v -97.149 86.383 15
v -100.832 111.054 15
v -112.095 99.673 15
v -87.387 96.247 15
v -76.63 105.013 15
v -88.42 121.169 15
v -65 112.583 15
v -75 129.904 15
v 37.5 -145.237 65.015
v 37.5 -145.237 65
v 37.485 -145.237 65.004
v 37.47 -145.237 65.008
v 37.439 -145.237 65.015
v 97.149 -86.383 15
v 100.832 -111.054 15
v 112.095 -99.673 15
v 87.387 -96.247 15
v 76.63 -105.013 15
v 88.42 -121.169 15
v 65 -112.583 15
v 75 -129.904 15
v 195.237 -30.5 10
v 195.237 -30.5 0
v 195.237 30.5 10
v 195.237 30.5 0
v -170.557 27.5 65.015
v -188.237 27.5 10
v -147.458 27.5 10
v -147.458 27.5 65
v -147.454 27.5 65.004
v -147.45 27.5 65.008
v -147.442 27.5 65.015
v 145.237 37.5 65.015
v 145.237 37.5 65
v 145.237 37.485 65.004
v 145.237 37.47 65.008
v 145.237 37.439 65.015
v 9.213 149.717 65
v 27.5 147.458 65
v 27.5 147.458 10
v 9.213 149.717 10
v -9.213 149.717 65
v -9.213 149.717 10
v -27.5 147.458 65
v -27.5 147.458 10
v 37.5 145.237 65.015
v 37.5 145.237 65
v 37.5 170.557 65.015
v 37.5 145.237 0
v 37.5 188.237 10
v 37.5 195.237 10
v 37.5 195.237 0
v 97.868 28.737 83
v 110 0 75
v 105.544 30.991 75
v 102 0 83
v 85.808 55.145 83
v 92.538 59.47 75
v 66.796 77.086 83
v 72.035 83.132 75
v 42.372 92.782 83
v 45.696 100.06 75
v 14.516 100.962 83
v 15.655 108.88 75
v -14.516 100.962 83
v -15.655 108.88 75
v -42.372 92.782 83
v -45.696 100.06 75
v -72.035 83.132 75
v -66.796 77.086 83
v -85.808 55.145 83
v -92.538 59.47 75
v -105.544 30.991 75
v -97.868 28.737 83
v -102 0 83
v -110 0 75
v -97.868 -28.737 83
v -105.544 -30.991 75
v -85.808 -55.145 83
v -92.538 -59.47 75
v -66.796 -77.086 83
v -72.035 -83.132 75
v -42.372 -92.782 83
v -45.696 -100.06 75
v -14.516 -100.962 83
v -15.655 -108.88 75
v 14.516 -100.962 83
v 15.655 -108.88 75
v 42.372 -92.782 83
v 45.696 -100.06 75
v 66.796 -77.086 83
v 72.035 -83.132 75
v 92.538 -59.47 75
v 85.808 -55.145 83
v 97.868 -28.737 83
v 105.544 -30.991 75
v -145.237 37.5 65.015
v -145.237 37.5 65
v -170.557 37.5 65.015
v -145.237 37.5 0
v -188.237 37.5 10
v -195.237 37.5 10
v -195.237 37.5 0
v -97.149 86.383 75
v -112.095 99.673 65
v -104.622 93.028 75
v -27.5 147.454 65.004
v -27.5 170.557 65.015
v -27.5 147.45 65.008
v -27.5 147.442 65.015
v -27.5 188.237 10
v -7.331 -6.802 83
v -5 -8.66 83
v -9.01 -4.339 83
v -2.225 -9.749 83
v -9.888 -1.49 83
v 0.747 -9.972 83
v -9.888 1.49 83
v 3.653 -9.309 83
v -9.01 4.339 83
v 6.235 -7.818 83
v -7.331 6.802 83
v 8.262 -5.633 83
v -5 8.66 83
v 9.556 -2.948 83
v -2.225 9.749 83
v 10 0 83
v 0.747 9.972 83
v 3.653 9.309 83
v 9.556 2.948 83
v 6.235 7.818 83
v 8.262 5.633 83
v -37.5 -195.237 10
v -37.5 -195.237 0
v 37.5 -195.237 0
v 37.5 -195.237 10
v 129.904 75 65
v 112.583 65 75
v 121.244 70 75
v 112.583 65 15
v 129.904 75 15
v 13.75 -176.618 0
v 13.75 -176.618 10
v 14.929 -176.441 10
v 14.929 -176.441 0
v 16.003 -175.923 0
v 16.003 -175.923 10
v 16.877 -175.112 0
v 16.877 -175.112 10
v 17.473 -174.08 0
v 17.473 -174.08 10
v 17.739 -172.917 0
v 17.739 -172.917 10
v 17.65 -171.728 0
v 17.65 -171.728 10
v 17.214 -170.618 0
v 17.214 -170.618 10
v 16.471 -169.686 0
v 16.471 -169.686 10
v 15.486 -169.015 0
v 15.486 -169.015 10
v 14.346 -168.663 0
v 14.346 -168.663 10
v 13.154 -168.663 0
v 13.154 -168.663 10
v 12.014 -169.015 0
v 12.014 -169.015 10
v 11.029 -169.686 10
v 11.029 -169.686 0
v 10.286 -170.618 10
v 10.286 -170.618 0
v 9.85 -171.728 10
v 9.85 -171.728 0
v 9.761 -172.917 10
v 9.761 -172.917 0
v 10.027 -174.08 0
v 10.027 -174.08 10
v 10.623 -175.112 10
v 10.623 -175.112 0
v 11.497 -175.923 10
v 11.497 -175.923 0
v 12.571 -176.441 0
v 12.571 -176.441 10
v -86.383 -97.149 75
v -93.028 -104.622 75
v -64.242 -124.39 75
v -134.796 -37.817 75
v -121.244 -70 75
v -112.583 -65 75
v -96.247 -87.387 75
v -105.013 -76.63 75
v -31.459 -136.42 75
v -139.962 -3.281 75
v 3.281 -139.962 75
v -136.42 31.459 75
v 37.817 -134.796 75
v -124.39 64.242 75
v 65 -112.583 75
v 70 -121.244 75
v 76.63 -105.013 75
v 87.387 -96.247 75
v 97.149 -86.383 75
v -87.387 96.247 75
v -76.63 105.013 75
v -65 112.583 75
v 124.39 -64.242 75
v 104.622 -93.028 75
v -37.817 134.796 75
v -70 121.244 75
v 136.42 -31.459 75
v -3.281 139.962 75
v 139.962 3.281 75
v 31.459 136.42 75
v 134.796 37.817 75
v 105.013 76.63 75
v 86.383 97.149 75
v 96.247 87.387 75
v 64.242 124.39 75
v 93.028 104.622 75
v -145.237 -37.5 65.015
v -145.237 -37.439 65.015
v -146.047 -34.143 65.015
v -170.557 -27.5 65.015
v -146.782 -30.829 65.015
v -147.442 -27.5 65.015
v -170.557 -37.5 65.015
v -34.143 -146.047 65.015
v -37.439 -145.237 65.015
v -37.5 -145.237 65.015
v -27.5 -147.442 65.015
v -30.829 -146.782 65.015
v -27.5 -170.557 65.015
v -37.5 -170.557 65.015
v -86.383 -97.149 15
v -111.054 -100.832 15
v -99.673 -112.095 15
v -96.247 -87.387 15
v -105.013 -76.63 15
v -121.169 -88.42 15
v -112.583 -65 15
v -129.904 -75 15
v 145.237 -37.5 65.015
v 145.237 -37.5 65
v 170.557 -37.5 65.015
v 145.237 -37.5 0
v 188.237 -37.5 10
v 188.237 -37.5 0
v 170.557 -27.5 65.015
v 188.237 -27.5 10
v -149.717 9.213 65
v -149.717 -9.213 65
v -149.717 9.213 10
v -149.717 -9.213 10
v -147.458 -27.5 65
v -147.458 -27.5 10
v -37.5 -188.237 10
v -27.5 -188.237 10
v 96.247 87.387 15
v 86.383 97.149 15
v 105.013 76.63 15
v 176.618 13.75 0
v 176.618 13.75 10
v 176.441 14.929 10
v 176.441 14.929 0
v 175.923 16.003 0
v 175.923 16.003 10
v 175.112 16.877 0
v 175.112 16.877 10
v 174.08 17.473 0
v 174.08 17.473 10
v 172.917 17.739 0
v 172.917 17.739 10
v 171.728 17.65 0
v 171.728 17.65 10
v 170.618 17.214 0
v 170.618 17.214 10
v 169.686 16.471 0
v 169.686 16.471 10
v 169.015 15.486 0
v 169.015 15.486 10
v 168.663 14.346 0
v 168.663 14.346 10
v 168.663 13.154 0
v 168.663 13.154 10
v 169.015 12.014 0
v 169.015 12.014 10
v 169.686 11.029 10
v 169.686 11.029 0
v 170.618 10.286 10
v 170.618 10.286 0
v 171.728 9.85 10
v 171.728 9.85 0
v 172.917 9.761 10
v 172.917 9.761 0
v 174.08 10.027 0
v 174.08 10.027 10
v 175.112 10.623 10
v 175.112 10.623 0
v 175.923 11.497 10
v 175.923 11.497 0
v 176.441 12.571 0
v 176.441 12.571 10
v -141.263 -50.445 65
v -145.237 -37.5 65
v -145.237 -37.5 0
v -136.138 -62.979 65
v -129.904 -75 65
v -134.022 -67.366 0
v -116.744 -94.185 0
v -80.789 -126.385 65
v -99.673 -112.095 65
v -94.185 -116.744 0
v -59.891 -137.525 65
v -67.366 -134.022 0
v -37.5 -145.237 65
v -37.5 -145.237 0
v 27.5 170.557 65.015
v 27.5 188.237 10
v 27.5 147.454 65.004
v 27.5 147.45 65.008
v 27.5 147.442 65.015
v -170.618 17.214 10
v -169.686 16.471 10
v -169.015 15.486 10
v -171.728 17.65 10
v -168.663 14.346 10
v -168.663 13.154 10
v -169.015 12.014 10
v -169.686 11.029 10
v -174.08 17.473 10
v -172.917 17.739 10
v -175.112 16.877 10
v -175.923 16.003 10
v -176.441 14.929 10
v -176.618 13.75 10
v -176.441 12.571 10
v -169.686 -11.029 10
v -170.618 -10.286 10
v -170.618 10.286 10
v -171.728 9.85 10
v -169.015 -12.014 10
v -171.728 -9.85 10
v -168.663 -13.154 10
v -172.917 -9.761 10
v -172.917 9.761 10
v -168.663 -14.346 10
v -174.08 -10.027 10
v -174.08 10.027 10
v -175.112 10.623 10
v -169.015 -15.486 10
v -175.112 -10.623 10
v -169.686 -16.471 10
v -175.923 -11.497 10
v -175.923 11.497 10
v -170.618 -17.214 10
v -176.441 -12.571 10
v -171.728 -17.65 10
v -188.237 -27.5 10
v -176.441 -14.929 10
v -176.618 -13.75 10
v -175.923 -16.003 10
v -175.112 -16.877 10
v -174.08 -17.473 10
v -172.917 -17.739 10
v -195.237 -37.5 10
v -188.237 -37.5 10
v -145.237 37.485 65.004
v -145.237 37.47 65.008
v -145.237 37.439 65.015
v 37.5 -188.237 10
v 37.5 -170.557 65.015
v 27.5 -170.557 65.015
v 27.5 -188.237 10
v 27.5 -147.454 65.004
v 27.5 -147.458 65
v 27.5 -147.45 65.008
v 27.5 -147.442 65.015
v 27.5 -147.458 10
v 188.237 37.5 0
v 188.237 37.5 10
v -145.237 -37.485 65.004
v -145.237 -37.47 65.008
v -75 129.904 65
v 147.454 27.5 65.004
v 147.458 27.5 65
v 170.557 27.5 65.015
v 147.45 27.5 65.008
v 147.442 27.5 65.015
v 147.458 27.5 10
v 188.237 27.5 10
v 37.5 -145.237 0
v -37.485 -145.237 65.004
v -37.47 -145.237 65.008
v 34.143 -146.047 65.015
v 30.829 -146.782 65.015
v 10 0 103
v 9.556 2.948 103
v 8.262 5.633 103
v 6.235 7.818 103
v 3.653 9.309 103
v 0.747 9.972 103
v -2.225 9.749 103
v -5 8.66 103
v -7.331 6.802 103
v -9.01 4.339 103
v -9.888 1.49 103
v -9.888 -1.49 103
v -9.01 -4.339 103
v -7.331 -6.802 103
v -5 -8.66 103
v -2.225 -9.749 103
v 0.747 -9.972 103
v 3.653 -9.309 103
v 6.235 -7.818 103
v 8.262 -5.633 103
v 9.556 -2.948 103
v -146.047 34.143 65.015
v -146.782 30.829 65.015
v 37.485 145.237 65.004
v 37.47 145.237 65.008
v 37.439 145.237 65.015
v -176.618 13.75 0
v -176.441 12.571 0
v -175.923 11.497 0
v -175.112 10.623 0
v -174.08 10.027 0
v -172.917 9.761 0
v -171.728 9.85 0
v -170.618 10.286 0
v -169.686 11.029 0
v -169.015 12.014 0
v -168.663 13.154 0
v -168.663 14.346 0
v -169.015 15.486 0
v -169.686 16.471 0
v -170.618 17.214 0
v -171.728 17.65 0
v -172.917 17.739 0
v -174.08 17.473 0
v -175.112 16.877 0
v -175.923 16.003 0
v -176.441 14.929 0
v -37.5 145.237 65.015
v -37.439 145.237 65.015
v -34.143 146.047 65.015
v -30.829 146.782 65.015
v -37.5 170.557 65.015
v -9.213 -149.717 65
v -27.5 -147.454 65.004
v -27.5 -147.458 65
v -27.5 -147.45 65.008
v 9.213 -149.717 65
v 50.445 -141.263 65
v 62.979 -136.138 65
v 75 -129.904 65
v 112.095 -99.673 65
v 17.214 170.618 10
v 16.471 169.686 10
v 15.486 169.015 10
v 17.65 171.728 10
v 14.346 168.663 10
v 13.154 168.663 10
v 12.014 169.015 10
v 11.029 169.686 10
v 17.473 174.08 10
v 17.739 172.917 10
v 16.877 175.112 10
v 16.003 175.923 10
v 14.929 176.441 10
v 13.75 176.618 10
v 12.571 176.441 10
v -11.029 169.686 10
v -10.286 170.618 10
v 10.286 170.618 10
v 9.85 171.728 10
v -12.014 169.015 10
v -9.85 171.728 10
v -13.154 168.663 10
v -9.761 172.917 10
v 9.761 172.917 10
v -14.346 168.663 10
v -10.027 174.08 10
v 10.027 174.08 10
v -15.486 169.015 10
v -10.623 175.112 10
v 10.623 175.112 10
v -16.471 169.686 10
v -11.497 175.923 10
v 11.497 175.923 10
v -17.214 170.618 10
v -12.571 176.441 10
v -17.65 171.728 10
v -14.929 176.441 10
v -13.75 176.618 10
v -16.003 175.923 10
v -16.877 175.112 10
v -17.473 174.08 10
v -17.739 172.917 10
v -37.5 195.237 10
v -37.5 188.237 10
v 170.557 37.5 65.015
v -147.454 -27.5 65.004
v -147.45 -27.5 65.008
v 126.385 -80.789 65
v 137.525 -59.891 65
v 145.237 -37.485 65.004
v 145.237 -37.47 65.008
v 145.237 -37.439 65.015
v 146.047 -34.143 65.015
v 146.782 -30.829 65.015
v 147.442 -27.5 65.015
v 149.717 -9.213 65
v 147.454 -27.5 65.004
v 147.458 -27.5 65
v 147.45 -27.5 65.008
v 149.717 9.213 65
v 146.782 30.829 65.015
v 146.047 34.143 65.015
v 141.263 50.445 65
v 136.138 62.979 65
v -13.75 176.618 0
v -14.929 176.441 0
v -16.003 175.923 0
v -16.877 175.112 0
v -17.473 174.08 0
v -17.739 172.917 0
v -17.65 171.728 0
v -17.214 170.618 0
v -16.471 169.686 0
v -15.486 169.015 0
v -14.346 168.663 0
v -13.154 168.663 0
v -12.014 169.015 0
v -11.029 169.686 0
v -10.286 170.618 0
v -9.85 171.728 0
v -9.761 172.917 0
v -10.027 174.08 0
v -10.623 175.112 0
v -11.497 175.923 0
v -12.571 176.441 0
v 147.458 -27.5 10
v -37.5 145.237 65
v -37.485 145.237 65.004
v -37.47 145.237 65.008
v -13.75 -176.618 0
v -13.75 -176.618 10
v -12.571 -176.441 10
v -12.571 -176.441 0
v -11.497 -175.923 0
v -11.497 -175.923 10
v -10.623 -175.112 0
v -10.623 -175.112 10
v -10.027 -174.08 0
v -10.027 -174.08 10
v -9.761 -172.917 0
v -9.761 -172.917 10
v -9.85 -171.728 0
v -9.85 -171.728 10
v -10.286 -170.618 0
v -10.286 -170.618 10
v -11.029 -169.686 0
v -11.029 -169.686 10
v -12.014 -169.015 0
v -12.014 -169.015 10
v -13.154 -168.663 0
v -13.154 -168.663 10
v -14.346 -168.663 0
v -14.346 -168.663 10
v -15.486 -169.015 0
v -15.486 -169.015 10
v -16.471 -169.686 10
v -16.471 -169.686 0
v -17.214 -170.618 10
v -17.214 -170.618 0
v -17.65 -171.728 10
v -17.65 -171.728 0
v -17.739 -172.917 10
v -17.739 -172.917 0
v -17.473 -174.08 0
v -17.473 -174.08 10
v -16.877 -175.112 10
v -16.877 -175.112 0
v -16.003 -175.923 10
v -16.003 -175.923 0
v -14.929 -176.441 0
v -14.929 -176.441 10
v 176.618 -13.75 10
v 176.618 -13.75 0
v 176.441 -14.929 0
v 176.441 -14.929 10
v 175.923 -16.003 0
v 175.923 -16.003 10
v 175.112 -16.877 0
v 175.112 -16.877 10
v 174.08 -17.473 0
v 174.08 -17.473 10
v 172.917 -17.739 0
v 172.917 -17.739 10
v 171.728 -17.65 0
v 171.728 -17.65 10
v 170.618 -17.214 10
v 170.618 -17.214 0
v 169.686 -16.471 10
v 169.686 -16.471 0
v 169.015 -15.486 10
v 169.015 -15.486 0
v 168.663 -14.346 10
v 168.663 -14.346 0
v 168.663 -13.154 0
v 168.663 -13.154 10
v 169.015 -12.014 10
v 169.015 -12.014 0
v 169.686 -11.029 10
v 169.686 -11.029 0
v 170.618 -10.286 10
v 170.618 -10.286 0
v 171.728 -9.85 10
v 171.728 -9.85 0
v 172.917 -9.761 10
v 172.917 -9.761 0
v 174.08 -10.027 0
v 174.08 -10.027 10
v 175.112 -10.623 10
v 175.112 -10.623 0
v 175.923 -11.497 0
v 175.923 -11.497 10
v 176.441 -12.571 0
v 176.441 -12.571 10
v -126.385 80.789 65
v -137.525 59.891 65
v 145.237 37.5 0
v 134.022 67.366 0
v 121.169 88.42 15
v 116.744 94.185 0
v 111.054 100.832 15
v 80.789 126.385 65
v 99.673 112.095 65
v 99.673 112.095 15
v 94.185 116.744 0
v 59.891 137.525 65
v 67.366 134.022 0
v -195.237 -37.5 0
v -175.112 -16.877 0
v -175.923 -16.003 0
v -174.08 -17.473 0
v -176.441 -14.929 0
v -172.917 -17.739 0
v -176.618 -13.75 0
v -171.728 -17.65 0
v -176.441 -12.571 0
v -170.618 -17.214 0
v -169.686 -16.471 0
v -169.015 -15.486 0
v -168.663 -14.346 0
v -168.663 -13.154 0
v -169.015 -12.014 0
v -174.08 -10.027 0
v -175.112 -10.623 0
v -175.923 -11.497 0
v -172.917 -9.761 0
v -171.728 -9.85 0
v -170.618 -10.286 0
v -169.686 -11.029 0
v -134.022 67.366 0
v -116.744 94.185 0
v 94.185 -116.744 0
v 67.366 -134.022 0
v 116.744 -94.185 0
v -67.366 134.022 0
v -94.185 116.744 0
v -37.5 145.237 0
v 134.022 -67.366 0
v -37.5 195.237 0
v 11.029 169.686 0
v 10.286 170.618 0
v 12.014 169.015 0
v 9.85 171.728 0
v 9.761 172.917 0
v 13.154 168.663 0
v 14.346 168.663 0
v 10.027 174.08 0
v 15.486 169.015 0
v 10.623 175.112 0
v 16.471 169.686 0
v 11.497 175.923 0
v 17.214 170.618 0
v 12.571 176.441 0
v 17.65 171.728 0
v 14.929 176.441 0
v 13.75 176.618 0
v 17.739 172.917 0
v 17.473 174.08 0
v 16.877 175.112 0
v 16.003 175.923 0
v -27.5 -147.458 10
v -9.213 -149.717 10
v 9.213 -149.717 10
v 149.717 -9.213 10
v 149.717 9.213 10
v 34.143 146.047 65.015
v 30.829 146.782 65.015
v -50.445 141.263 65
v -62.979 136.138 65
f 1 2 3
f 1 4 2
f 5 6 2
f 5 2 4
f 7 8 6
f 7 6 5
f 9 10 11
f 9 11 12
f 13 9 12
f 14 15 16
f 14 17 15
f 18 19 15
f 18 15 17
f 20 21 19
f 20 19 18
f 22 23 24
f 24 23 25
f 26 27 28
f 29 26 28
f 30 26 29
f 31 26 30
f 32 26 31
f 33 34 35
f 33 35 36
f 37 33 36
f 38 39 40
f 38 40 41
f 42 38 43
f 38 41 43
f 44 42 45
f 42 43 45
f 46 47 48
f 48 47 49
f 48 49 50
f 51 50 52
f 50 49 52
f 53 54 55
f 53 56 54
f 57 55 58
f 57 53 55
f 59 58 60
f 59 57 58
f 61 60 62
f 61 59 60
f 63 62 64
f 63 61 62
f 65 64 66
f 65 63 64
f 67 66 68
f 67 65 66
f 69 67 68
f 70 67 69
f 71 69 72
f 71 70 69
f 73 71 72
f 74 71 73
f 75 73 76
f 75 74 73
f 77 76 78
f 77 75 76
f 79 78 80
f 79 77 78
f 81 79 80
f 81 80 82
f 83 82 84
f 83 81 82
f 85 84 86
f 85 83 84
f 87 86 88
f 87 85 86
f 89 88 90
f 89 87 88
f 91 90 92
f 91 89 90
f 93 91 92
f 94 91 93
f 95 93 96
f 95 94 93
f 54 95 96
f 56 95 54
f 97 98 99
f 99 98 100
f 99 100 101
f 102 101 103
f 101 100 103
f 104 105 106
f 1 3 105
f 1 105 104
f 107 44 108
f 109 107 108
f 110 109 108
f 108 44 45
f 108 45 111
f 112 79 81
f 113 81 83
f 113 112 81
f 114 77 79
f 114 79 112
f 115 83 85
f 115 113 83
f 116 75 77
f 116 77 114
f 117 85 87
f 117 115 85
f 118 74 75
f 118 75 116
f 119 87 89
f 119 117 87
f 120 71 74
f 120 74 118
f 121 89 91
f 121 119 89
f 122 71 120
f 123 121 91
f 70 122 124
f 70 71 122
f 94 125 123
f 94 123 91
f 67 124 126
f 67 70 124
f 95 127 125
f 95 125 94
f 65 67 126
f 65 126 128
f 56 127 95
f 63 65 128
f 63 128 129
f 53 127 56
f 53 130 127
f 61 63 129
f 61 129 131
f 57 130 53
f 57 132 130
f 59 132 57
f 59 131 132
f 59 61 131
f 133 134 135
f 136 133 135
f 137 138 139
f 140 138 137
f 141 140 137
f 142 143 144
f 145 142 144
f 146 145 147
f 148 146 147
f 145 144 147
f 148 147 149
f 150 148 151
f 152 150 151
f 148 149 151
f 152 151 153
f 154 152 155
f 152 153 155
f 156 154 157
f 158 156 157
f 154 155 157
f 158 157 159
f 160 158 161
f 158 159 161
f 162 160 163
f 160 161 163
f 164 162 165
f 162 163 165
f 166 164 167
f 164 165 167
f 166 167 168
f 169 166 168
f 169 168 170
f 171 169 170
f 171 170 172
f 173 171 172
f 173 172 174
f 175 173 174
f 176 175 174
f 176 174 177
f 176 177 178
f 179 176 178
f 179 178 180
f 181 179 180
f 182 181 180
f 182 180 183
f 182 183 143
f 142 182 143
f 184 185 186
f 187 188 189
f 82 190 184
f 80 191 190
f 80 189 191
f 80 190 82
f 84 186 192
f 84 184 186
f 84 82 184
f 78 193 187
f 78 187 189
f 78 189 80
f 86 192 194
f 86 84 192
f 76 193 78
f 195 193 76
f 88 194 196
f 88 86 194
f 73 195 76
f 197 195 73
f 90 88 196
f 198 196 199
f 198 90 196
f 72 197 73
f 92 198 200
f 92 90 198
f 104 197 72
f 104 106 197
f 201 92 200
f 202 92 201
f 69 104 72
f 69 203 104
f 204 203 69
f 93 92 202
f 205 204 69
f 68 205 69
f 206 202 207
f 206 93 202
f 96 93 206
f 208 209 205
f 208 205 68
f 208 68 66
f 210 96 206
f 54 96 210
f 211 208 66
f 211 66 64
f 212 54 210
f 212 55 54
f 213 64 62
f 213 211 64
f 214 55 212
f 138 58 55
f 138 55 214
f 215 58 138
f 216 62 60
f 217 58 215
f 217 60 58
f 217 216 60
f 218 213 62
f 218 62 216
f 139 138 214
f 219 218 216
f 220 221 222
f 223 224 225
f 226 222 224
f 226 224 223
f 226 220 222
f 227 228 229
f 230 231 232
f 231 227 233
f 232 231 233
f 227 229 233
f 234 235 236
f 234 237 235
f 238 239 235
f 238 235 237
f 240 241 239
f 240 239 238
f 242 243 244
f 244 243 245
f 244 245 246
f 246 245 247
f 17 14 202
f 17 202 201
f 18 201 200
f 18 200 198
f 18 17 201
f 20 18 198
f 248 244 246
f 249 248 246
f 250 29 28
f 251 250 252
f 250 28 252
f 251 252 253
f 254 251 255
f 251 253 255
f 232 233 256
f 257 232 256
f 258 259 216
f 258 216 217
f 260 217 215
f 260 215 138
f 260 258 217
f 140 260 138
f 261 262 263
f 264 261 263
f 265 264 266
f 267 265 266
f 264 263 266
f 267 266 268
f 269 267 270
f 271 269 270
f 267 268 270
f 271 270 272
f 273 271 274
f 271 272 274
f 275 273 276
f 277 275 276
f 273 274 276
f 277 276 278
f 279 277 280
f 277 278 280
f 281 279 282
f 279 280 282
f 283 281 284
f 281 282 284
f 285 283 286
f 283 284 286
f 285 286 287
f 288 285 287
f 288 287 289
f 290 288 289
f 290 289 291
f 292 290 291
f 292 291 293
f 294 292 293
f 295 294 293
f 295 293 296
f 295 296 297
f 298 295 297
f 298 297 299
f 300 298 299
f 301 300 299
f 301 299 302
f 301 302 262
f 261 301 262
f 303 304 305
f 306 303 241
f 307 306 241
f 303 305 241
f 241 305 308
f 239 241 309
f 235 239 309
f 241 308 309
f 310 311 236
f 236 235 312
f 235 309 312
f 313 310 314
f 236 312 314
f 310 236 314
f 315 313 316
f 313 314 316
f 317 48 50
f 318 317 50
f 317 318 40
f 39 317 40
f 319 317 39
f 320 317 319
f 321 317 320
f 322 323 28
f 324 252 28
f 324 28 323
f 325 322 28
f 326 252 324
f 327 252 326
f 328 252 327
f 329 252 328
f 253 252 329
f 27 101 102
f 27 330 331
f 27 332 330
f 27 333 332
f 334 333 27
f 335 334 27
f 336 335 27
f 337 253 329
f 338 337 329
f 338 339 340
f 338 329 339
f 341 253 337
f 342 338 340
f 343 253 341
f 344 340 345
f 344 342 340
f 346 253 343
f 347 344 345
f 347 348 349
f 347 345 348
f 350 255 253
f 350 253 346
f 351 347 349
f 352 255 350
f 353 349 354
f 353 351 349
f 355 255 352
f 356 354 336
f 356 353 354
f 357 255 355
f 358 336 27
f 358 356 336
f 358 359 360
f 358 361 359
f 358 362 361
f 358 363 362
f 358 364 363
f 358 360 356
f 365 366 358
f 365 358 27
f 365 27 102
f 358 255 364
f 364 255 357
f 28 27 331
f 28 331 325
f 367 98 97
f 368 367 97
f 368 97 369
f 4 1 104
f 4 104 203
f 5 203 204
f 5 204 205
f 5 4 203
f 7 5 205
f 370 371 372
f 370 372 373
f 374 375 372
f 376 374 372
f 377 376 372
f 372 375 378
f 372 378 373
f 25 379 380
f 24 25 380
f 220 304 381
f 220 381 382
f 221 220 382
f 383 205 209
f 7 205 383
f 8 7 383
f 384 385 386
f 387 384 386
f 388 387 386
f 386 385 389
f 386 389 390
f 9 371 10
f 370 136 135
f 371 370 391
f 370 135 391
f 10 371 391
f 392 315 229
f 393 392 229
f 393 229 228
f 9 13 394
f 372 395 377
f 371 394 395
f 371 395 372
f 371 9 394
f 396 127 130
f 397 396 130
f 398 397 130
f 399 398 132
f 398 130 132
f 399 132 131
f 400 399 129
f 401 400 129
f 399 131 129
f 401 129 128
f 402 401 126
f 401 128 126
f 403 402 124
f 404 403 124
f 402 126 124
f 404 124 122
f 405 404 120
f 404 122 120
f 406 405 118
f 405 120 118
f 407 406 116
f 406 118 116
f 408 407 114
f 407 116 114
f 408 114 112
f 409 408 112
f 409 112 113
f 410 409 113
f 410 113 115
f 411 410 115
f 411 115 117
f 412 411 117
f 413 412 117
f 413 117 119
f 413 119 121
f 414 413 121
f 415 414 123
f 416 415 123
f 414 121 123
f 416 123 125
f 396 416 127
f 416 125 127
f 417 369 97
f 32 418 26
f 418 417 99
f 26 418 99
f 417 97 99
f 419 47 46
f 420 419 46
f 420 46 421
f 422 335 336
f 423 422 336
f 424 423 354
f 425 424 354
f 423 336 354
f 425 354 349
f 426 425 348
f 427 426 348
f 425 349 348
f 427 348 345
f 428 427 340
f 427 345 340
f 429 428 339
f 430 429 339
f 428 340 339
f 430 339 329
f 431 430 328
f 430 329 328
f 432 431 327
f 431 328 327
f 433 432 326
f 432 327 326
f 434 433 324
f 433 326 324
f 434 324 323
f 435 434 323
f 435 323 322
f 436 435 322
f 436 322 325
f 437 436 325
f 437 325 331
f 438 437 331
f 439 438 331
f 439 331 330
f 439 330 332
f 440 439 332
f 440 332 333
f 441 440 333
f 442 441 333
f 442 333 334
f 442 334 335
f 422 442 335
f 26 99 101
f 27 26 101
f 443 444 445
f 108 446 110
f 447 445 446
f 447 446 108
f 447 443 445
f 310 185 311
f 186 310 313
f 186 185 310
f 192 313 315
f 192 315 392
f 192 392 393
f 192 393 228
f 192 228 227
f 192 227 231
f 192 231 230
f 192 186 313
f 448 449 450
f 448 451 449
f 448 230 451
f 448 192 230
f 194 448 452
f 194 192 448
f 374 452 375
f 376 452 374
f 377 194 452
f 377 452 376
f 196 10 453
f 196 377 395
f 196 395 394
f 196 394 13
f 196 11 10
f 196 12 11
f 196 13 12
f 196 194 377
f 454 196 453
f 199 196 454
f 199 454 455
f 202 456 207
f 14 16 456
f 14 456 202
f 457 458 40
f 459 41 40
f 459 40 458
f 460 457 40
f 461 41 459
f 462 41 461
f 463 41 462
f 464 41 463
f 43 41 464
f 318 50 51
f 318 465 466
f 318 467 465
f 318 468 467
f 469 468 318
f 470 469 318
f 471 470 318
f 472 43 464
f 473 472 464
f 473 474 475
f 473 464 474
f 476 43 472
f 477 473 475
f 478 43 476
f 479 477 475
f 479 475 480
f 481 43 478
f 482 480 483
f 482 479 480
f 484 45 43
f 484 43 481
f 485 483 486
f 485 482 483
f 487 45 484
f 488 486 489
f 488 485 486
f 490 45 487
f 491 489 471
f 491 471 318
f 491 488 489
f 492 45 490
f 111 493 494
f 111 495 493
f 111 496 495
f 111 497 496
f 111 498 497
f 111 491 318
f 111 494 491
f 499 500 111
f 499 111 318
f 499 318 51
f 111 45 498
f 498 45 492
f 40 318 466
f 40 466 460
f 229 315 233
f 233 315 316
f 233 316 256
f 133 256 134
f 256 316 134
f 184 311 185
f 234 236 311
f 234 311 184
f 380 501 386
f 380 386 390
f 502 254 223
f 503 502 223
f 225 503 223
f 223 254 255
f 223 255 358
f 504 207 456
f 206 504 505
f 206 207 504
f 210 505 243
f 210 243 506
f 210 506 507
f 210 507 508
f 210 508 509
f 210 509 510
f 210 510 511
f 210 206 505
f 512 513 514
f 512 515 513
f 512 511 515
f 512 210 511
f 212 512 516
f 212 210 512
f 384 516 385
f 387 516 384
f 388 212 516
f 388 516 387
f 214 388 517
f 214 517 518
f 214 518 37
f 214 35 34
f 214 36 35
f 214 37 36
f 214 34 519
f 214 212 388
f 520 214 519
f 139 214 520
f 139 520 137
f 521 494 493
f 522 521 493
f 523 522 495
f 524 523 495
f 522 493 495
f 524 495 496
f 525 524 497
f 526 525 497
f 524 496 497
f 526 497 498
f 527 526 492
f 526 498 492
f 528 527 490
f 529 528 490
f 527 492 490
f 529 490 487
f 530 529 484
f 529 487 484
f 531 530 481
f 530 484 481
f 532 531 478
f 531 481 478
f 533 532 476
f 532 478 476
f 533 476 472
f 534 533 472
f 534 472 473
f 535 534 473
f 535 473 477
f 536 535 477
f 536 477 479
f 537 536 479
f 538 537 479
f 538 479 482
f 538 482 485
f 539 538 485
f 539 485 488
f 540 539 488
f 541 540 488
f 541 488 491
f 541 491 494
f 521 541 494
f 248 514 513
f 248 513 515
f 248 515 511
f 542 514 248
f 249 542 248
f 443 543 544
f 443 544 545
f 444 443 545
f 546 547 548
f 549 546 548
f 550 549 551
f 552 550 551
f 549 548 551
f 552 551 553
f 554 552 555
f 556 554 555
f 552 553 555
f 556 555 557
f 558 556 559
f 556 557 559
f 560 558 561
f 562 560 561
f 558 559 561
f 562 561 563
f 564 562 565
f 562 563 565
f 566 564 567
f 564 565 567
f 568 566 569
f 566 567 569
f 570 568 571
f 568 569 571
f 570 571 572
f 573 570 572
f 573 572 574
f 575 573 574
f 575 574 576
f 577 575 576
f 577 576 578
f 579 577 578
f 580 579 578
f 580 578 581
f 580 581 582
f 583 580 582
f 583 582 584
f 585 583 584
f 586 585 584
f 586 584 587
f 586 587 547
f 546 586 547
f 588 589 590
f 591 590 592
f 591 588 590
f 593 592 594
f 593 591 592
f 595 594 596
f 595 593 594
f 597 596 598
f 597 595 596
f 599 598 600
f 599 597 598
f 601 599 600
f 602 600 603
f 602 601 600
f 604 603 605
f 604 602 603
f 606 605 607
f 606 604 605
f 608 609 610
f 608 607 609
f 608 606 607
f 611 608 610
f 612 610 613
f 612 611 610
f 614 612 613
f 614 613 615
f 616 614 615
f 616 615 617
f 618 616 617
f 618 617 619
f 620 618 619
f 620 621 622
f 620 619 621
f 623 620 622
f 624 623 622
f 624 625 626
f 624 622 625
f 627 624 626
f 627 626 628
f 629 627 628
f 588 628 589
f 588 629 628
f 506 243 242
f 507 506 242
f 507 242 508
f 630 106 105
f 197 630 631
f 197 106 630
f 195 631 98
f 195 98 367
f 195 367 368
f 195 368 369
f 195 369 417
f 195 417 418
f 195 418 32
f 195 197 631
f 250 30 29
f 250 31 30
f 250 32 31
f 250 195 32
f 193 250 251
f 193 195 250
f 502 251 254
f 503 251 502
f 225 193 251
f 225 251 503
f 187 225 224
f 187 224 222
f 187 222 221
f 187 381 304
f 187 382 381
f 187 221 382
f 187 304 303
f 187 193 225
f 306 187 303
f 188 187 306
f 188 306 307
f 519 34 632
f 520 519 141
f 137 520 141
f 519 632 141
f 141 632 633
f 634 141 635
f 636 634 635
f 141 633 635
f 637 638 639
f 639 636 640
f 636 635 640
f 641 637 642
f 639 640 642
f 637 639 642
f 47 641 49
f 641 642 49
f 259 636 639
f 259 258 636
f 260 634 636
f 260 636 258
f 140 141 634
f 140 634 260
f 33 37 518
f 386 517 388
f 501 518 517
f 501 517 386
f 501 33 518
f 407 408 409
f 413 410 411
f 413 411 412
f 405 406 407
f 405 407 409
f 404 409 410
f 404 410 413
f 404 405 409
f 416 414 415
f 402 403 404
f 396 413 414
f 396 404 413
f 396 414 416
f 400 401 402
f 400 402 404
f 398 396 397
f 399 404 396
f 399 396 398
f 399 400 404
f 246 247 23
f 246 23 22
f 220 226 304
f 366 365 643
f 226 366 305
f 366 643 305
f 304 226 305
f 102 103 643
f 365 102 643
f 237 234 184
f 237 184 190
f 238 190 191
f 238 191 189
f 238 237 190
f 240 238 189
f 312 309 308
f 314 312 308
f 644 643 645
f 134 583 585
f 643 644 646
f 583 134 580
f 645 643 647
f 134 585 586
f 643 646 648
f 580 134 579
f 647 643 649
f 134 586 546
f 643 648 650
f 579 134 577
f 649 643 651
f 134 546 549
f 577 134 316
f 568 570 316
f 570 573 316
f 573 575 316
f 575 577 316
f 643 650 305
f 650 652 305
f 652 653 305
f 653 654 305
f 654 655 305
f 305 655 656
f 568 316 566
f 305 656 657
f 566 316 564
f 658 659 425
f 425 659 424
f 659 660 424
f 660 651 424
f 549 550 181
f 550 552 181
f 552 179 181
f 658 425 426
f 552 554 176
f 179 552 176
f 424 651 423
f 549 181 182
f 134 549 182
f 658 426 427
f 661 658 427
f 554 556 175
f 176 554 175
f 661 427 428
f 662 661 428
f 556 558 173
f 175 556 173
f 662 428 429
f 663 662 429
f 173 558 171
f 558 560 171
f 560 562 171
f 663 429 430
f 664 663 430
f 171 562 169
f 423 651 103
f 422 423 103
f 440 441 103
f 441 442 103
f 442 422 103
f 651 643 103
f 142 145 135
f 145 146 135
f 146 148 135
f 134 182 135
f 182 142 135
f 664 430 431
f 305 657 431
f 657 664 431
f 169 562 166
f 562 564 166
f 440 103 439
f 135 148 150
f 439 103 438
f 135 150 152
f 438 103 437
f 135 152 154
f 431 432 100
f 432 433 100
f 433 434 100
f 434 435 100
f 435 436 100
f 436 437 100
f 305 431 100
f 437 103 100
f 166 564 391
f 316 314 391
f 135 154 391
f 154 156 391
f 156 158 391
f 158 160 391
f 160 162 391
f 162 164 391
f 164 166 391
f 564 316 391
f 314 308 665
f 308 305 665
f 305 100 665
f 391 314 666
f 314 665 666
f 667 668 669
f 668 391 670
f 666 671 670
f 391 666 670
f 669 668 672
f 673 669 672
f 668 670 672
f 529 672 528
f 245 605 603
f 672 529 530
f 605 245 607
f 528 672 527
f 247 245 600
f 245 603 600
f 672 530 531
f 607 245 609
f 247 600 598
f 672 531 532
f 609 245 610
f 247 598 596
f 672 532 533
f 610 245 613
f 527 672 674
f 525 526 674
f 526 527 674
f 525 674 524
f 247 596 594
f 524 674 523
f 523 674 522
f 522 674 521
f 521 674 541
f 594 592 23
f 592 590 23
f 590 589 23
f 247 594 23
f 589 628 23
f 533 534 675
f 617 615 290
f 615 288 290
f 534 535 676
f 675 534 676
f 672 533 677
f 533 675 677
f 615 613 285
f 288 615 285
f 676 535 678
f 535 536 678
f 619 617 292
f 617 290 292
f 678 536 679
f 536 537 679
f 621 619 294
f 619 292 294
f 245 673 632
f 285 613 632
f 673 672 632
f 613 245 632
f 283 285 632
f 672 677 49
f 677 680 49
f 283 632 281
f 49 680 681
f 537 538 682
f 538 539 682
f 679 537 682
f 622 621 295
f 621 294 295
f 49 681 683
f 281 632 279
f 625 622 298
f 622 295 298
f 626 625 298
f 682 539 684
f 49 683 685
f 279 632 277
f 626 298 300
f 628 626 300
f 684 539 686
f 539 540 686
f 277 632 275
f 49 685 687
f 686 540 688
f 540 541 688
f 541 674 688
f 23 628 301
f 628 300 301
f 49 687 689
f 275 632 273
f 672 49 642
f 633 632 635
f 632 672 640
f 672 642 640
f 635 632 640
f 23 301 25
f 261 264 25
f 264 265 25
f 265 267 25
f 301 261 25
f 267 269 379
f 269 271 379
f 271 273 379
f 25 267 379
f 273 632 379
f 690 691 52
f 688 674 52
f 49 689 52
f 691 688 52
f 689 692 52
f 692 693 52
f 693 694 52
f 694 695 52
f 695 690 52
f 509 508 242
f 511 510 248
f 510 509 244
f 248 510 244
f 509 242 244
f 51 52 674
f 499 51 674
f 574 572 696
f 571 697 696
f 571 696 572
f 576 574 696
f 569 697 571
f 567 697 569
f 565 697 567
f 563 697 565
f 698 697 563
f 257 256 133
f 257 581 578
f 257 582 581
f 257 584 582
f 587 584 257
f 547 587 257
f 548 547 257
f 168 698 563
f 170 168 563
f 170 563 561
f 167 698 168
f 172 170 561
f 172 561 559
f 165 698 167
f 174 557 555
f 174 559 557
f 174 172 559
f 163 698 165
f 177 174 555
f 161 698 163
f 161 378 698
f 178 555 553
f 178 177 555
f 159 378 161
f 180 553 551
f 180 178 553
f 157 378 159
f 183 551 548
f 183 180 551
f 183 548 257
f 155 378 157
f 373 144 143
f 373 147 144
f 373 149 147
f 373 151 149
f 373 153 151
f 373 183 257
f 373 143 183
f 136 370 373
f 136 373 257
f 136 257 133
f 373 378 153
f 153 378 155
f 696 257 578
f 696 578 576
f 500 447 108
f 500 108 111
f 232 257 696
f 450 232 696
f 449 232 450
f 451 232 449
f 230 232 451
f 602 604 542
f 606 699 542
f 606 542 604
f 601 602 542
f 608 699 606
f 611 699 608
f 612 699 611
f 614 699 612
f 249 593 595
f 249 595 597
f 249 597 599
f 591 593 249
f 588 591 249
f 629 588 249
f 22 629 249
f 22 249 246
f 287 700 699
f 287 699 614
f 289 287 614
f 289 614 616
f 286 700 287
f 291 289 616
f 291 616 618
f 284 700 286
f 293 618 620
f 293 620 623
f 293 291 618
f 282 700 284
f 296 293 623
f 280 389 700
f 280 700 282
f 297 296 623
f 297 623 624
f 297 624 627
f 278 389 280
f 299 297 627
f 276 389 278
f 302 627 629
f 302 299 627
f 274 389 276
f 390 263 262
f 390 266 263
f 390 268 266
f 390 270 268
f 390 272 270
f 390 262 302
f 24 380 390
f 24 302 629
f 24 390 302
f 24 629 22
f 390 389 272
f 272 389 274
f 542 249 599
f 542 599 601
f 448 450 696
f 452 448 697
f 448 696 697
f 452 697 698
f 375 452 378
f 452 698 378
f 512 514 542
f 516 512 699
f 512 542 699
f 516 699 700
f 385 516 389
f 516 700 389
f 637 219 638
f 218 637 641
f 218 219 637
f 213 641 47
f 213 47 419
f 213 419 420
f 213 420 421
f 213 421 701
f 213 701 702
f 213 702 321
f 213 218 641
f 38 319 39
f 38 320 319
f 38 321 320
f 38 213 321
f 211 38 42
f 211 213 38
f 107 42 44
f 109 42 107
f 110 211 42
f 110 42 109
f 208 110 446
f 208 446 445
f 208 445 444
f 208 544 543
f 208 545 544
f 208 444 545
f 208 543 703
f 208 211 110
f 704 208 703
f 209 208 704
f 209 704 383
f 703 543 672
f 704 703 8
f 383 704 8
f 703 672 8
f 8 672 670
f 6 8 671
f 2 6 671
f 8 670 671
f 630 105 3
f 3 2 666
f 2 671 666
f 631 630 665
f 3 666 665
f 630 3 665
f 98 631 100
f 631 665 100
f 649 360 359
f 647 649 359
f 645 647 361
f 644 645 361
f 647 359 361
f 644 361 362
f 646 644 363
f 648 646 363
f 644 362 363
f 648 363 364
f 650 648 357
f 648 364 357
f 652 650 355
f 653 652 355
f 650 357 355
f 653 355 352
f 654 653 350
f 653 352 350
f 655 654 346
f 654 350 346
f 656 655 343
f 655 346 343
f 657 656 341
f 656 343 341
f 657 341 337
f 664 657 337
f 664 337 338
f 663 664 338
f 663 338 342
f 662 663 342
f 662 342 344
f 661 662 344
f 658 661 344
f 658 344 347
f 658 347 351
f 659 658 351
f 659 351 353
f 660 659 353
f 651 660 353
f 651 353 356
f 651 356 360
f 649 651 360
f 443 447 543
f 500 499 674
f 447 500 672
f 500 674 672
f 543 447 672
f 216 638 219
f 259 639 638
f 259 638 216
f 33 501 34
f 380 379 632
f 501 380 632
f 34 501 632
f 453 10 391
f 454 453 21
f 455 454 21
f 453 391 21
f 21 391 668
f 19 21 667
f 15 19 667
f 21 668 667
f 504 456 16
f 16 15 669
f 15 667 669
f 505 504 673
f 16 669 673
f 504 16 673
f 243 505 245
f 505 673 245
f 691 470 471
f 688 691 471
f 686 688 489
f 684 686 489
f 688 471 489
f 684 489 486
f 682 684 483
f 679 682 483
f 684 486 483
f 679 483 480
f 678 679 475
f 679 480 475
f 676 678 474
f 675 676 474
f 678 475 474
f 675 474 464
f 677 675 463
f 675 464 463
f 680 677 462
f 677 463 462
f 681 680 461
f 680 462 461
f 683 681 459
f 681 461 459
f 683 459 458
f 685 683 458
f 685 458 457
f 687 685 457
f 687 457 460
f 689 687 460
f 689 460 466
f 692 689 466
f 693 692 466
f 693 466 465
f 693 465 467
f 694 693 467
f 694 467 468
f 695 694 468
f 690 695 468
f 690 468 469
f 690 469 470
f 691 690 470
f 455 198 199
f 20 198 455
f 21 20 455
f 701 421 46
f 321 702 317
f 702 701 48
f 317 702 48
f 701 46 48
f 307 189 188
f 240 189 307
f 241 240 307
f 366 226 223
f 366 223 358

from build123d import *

# Parameters (mm, degrees)
IZIM1_R                           = 150
Y_KSEKLIK_EKSTR_ZYON1_DEPTH       = 75
PAH1_SIZE                         = 10
Y_KSEKLIK_EKSTR_ZYON2_START       = -75
Y_KSEKLIK_EKSTR_ZYON2_DEPTH       = 10
PAH2_SIZE                         = 7
Y_KSEKLIK_EKSTR_ZYON3_DEPTH       = 10
IZIM8_R                           = 4
KES_EKSTR_ZYON1_DEPTH             = 255.641782801
DAIRESEL_KAPLAMA1_COUNT           = 4
DAIRESEL_KAPLAMA1_COPY_1_DEPTH    = 10
DAIRESEL_KAPLAMA1_COPY_2_DEPTH    = 10
DAIRESEL_KAPLAMA1_COPY_3_DEPTH    = 10
DAIRESEL_KAPLAMA1_COPY_4_SKETCH_R = 4
DAIRESEL_KAPLAMA1_COPY_4_DEPTH    = 255.641782801
DAIRESEL_KAPLAMA1_COPY_5_SKETCH_R = 4
DAIRESEL_KAPLAMA1_COPY_5_DEPTH    = 255.641782801
DAIRESEL_KAPLAMA1_COPY_6_SKETCH_R = 4
DAIRESEL_KAPLAMA1_COPY_6_DEPTH    = 255.641782801
KES_EKSTR_ZYON2_START             = -60
KES_EKSTR_ZYON2_DEPTH             = 60
DAIRESEL_KAPLAMA2_COUNT           = 4
IZIM10_R                          = 110
Y_KSEKLIK_EKSTR_ZYON4_DEPTH       = 8
Y_KSEKLIK_EKSTR_ZYON4_TAPER       = 45
IZIM11_R                          = 10
Y_KSEKLIK_EKSTR_ZYON5_DEPTH       = 20


with BuildPart() as part:
    # Çizim1 → Yükseklik-Ekstrüzyon1 (new body)
    with BuildSketch(Plane.XY):
        Circle(IZIM1_R)
    extrude(amount=Y_KSEKLIK_EKSTR_ZYON1_DEPTH)

    # Pah1
    pah1_edges = [part.edges().sort_by_distance(p)[0] for p in [
        (-150, 0, 75),
    ]]
    chamfer(pah1_edges, length=PAH1_SIZE)

    # Çizim4 → Yükseklik-Ekstrüzyon2 (add)
    with BuildSketch(Plane.XY.offset(75).offset(Y_KSEKLIK_EKSTR_ZYON2_START)):
        with BuildLine():
            Line((195.236875483, -37.5), (195.236875483, 37.5))
            Line((195.236875483, 37.5), (145.236875483, 37.5))
            ThreePointArc((145.236875483, 37.5), (150, 0), (145.236875483, -37.5))
            Line((145.236875483, -37.5), (195.236875483, -37.5))
        make_face()
    y_kseklik_ekstr_zyon2 = extrude(amount=Y_KSEKLIK_EKSTR_ZYON2_DEPTH)

    # Pah2
    pah2_edges = [part.edges().sort_by_distance(p)[0] for p in [
        (195.236875483, -37.5, 5),
        (195.236875483, 37.5, 5),
    ]]
    chamfer(pah2_edges, length=PAH2_SIZE)

    # Çizim7 → Yükseklik-Ekstrüzyon3 (add)
    with BuildSketch(Plane(origin=(0, 37.5, 0), x_dir=(1, 0, 0), z_dir=(0, 1, 0))):
        Polygon((145.236875483, 0), (145.236875483, -65.015207496), (170.556875483, -65.015207496), (188.236875483, -10), (188.236875483, 0), align=None)
    y_kseklik_ekstr_zyon3 = extrude(amount=-Y_KSEKLIK_EKSTR_ZYON3_DEPTH)

    # Çizim8 → Kes-Ekstrüzyon1 (cut, through all)
    with BuildSketch(Plane.XY.offset(10)):
        with Locations((172.618437741, 13.75)):
            Circle(IZIM8_R)
    kes_ekstr_zyon1 = extrude(amount=-KES_EKSTR_ZYON1_DEPTH, mode=Mode.SUBTRACT)

    # Aynalama1: Yükseklik-Ekstrüzyon3, Kes-Ekstrüzyon1 across plane
    add(y_kseklik_ekstr_zyon3.mirror(Plane.ZX))
    add(kes_ekstr_zyon1.mirror(Plane.ZX), mode=Mode.SUBTRACT)

    # Dairesel Kaplama1: Yükseklik-Ekstrüzyon2, Yükseklik-Ekstrüzyon3, Kes-Ekstrüzyon1 ×4 about axis
    dairesel_kaplama1_axis = Axis((0, 0, 0), (0, 0, 1))
    add([y_kseklik_ekstr_zyon2.rotate(dairesel_kaplama1_axis, i * 360 / DAIRESEL_KAPLAMA1_COUNT) for i in range(1, DAIRESEL_KAPLAMA1_COUNT)])
    add([y_kseklik_ekstr_zyon3.rotate(dairesel_kaplama1_axis, i * 360 / DAIRESEL_KAPLAMA1_COUNT) for i in range(1, DAIRESEL_KAPLAMA1_COUNT)])
    add([kes_ekstr_zyon1.rotate(dairesel_kaplama1_axis, i * 360 / DAIRESEL_KAPLAMA1_COUNT) for i in range(1, DAIRESEL_KAPLAMA1_COUNT)], mode=Mode.SUBTRACT)

    # Dairesel Kaplama1 copy 1 sketch → Dairesel Kaplama1 copy 1 (add)
    with BuildSketch(Plane.YZ.offset(37.5)):
        Polygon((145.236875483, 0), (145.236875483, 65.015207496), (170.556875483, 65.015207496), (188.236875483, 10), (188.236875483, 0), align=None)
    extrude(amount=-DAIRESEL_KAPLAMA1_COPY_1_DEPTH)

    # Dairesel Kaplama1 copy 2 sketch → Dairesel Kaplama1 copy 2 (add)
    with BuildSketch(Plane(origin=(0, 37.5, 0), x_dir=(-1, 0, 0), z_dir=(0, 1, 0))):
        Polygon((145.236875483, 0), (145.236875483, 65.015207496), (170.556875483, 65.015207496), (188.236875483, 10), (188.236875483, 0), align=None)
    extrude(amount=-DAIRESEL_KAPLAMA1_COPY_2_DEPTH)

    # Dairesel Kaplama1 copy 3 sketch → Dairesel Kaplama1 copy 3 (add)
    with BuildSketch(Plane(origin=(-37.5, 0, 0), x_dir=(0, -1, 0), z_dir=(-1, 0, 0))):
        Polygon((145.236875483, 0), (145.236875483, 65.015207496), (170.556875483, 65.015207496), (188.236875483, 10), (188.236875483, 0), align=None)
    extrude(amount=-DAIRESEL_KAPLAMA1_COPY_3_DEPTH)

    # Dairesel Kaplama1 copy 4 sketch → Dairesel Kaplama1 copy 4 (cut, through all)
    with BuildSketch(Plane(origin=(0, 0, 10), x_dir=(0, 1, 0), z_dir=(0, 0, 1))):
        with Locations((172.618437741, -13.75)):
            Circle(DAIRESEL_KAPLAMA1_COPY_4_SKETCH_R)
    extrude(amount=-DAIRESEL_KAPLAMA1_COPY_4_DEPTH, mode=Mode.SUBTRACT)

    # Dairesel Kaplama1 copy 5 sketch → Dairesel Kaplama1 copy 5 (cut, through all)
    with BuildSketch(Plane(origin=(0, 0, 10), x_dir=(-1, 0, 0), z_dir=(0, 0, 1))):
        with Locations((172.618437741, -13.75)):
            Circle(DAIRESEL_KAPLAMA1_COPY_5_SKETCH_R)
    extrude(amount=-DAIRESEL_KAPLAMA1_COPY_5_DEPTH, mode=Mode.SUBTRACT)

    # Dairesel Kaplama1 copy 6 sketch → Dairesel Kaplama1 copy 6 (cut, through all)
    with BuildSketch(Plane(origin=(0, 0, 10), x_dir=(0, -1, 0), z_dir=(0, 0, 1))):
        with Locations((172.618437741, -13.75)):
            Circle(DAIRESEL_KAPLAMA1_COPY_6_SKETCH_R)
    extrude(amount=-DAIRESEL_KAPLAMA1_COPY_6_DEPTH, mode=Mode.SUBTRACT)

    # Çizim9 → Kes-Ekstrüzyon2 (cut)
    with BuildSketch(Plane.XY.offset(75).offset(KES_EKSTR_ZYON2_START)):
        with BuildLine():
            Line((-112.583302492, -65), (-129.903810568, -75))
            ThreePointArc((-129.903810568, -75), (-116.277268219, -94.760734988), (-99.673152863, -112.094882124))
            Line((-99.673152863, -112.094882124), (-86.383399148, -97.148897841))
            ThreePointArc((-86.383399148, -97.148897841), (-100.773632456, -82.125970323), (-112.583302492, -65))
        make_face()
    kes_ekstr_zyon2 = extrude(amount=KES_EKSTR_ZYON2_DEPTH, mode=Mode.SUBTRACT)

    # Dairesel Kaplama2: Kes-Ekstrüzyon2 ×4 about axis
    dairesel_kaplama2_axis = Axis((0, 0, 75), (0, 0, 1))
    for i in range(1, DAIRESEL_KAPLAMA2_COUNT):
        add(kes_ekstr_zyon2.rotate(dairesel_kaplama2_axis, i * 360 / DAIRESEL_KAPLAMA2_COUNT), mode=Mode.SUBTRACT)

    # Çizim10 → Yükseklik-Ekstrüzyon4 (add)
    with BuildSketch(Plane.XY.offset(75)):
        Circle(IZIM10_R)
    extrude(amount=Y_KSEKLIK_EKSTR_ZYON4_DEPTH, taper=Y_KSEKLIK_EKSTR_ZYON4_TAPER)

    # Çizim11 → Yükseklik-Ekstrüzyon5 (add)
    with BuildSketch(Plane.XY.offset(83)):
        Circle(IZIM11_R)
    extrude(amount=Y_KSEKLIK_EKSTR_ZYON5_DEPTH)


solid = part.part
